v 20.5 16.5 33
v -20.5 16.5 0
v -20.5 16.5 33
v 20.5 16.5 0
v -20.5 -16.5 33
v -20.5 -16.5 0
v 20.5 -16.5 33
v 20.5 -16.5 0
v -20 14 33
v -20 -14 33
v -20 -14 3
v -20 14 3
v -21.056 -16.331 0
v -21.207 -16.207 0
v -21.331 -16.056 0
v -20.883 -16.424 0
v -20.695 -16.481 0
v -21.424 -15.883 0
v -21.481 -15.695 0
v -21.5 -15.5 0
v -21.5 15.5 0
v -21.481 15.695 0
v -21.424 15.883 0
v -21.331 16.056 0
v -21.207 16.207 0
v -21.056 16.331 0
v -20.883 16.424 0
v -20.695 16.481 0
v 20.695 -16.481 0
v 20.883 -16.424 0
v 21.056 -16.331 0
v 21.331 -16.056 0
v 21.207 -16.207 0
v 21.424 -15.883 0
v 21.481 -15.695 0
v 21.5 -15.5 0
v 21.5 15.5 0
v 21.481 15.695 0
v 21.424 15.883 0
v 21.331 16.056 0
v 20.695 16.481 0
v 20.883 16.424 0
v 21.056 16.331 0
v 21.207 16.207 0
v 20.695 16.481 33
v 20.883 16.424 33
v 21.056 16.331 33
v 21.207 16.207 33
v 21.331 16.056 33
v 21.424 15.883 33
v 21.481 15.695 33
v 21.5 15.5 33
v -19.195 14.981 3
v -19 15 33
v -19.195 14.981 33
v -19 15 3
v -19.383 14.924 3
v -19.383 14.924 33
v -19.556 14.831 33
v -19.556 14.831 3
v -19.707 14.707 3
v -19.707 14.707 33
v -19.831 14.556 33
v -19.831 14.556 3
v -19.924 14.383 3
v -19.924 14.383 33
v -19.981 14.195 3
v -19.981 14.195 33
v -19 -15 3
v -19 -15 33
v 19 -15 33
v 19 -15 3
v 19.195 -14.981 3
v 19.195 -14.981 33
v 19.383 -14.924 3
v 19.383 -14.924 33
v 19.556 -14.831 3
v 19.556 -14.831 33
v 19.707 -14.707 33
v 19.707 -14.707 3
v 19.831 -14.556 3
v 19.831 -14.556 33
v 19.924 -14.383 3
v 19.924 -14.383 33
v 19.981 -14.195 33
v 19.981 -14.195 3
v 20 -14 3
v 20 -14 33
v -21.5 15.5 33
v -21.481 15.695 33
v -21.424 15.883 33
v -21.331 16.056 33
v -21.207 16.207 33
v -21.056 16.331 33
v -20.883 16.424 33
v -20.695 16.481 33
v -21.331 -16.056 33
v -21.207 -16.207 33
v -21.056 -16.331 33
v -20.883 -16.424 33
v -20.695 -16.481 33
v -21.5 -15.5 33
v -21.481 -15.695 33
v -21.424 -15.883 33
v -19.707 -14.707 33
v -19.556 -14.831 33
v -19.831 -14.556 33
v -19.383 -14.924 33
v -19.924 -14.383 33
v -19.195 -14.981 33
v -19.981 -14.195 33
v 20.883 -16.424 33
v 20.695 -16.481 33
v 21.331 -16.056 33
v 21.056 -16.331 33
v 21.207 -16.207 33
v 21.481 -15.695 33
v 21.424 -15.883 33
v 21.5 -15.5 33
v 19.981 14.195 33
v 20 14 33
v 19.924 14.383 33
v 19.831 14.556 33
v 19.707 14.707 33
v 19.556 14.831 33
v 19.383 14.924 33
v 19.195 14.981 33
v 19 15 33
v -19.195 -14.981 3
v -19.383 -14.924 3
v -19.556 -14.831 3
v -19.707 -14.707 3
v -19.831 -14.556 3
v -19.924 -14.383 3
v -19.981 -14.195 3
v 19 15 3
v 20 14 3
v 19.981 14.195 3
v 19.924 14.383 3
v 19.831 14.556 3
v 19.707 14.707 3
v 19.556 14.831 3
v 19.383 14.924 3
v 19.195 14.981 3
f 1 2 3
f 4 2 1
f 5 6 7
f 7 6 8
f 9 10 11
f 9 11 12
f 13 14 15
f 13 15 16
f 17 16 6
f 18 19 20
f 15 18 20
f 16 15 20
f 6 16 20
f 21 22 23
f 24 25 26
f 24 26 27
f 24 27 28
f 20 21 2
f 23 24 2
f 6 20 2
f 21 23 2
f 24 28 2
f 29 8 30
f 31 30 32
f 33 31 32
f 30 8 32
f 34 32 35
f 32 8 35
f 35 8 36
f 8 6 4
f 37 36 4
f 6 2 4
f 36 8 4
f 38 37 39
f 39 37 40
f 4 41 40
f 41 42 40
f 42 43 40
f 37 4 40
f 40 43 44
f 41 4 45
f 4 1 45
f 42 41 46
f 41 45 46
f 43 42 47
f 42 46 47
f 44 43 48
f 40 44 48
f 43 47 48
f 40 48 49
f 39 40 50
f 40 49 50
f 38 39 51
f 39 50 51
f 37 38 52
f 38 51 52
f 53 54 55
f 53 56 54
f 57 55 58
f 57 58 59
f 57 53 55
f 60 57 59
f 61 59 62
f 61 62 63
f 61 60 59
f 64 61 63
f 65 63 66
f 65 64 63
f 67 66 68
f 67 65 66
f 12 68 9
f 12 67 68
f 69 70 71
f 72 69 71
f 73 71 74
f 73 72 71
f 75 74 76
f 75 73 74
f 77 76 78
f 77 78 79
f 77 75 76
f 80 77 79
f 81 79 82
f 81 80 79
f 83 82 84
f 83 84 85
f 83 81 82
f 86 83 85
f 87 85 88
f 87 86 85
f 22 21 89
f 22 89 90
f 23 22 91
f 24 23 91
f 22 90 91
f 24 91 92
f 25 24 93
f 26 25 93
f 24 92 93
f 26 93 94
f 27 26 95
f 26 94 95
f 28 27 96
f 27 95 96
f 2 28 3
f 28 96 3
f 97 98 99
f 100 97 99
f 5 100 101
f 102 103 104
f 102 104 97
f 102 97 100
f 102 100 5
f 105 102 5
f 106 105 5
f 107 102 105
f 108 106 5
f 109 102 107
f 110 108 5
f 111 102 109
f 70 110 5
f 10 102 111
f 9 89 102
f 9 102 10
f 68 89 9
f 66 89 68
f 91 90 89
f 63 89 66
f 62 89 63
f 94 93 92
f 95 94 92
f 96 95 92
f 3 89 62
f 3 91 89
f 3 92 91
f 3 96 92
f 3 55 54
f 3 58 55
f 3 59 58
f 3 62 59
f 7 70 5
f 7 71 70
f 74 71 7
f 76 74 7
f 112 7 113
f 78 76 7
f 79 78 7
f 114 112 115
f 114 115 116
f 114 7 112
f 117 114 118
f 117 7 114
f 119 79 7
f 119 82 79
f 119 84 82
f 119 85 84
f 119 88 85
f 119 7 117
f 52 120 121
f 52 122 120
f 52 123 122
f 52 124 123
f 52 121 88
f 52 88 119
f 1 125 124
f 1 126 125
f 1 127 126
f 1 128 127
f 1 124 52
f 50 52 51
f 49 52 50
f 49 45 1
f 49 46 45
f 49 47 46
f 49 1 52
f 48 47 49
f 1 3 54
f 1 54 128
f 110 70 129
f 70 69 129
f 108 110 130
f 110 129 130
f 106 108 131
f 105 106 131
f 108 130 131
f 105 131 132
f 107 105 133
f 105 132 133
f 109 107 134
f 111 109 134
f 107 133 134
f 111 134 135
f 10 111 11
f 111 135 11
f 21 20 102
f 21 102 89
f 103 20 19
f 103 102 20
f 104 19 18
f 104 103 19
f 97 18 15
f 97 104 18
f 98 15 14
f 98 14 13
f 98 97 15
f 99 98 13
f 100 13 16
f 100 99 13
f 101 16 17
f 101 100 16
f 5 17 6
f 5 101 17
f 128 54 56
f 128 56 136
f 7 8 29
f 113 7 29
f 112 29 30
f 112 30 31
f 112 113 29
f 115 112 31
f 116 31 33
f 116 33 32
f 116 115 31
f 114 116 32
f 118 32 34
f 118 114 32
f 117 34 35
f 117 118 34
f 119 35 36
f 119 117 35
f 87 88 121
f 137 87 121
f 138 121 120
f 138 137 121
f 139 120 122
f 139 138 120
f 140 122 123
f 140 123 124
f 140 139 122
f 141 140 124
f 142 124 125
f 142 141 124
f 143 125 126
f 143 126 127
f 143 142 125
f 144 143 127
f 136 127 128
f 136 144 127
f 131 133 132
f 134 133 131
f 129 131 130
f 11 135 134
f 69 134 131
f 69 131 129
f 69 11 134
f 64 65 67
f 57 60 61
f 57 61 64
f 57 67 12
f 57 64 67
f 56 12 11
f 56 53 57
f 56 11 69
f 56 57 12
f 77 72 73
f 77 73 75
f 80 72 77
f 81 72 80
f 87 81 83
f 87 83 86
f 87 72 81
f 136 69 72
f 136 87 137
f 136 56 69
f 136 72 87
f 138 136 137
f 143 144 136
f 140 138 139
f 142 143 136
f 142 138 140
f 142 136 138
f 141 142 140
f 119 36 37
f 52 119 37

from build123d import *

# Parameters (mm, degrees)
F0_W     = 43
F0_H     = 33
F1_DEPTH = 33
F2_W     = 40
F2_H     = 30
F3_DEPTH = 30
F4_R     = 1
F5_R     = 1


with BuildPart() as f1:
    # F0 (on Top) → F1 (new body)
    with BuildSketch(Plane.XY):
        Rectangle(F0_W, F0_H)
    extrude(amount=F1_DEPTH)

    # F2 (on face) → F3 (cut)
    with BuildSketch(Plane.XY.offset(33)):
        Rectangle(F2_W, F2_H)
    extrude(amount=-F3_DEPTH, mode=Mode.SUBTRACT)

    # F4
    f4_edges = [f1.edges().sort_by_distance(p)[0] for p in [
        (-21.5, -16.5, 16.5),
        (21.5, -16.5, 16.5),
        (21.5, 16.5, 16.5),
        (-21.5, 16.5, 16.5),
    ]]
    fillet(f4_edges, radius=F4_R)

    # F5
    f5_edges = [f1.edges().sort_by_distance(p)[0] for p in [
        (-20, -15, 18),
        (-20, 15, 18),
        (20, 15, 18),
        (20, -15, 18),
    ]]
    fillet(f5_edges, radius=F5_R)


solid = f1.part
